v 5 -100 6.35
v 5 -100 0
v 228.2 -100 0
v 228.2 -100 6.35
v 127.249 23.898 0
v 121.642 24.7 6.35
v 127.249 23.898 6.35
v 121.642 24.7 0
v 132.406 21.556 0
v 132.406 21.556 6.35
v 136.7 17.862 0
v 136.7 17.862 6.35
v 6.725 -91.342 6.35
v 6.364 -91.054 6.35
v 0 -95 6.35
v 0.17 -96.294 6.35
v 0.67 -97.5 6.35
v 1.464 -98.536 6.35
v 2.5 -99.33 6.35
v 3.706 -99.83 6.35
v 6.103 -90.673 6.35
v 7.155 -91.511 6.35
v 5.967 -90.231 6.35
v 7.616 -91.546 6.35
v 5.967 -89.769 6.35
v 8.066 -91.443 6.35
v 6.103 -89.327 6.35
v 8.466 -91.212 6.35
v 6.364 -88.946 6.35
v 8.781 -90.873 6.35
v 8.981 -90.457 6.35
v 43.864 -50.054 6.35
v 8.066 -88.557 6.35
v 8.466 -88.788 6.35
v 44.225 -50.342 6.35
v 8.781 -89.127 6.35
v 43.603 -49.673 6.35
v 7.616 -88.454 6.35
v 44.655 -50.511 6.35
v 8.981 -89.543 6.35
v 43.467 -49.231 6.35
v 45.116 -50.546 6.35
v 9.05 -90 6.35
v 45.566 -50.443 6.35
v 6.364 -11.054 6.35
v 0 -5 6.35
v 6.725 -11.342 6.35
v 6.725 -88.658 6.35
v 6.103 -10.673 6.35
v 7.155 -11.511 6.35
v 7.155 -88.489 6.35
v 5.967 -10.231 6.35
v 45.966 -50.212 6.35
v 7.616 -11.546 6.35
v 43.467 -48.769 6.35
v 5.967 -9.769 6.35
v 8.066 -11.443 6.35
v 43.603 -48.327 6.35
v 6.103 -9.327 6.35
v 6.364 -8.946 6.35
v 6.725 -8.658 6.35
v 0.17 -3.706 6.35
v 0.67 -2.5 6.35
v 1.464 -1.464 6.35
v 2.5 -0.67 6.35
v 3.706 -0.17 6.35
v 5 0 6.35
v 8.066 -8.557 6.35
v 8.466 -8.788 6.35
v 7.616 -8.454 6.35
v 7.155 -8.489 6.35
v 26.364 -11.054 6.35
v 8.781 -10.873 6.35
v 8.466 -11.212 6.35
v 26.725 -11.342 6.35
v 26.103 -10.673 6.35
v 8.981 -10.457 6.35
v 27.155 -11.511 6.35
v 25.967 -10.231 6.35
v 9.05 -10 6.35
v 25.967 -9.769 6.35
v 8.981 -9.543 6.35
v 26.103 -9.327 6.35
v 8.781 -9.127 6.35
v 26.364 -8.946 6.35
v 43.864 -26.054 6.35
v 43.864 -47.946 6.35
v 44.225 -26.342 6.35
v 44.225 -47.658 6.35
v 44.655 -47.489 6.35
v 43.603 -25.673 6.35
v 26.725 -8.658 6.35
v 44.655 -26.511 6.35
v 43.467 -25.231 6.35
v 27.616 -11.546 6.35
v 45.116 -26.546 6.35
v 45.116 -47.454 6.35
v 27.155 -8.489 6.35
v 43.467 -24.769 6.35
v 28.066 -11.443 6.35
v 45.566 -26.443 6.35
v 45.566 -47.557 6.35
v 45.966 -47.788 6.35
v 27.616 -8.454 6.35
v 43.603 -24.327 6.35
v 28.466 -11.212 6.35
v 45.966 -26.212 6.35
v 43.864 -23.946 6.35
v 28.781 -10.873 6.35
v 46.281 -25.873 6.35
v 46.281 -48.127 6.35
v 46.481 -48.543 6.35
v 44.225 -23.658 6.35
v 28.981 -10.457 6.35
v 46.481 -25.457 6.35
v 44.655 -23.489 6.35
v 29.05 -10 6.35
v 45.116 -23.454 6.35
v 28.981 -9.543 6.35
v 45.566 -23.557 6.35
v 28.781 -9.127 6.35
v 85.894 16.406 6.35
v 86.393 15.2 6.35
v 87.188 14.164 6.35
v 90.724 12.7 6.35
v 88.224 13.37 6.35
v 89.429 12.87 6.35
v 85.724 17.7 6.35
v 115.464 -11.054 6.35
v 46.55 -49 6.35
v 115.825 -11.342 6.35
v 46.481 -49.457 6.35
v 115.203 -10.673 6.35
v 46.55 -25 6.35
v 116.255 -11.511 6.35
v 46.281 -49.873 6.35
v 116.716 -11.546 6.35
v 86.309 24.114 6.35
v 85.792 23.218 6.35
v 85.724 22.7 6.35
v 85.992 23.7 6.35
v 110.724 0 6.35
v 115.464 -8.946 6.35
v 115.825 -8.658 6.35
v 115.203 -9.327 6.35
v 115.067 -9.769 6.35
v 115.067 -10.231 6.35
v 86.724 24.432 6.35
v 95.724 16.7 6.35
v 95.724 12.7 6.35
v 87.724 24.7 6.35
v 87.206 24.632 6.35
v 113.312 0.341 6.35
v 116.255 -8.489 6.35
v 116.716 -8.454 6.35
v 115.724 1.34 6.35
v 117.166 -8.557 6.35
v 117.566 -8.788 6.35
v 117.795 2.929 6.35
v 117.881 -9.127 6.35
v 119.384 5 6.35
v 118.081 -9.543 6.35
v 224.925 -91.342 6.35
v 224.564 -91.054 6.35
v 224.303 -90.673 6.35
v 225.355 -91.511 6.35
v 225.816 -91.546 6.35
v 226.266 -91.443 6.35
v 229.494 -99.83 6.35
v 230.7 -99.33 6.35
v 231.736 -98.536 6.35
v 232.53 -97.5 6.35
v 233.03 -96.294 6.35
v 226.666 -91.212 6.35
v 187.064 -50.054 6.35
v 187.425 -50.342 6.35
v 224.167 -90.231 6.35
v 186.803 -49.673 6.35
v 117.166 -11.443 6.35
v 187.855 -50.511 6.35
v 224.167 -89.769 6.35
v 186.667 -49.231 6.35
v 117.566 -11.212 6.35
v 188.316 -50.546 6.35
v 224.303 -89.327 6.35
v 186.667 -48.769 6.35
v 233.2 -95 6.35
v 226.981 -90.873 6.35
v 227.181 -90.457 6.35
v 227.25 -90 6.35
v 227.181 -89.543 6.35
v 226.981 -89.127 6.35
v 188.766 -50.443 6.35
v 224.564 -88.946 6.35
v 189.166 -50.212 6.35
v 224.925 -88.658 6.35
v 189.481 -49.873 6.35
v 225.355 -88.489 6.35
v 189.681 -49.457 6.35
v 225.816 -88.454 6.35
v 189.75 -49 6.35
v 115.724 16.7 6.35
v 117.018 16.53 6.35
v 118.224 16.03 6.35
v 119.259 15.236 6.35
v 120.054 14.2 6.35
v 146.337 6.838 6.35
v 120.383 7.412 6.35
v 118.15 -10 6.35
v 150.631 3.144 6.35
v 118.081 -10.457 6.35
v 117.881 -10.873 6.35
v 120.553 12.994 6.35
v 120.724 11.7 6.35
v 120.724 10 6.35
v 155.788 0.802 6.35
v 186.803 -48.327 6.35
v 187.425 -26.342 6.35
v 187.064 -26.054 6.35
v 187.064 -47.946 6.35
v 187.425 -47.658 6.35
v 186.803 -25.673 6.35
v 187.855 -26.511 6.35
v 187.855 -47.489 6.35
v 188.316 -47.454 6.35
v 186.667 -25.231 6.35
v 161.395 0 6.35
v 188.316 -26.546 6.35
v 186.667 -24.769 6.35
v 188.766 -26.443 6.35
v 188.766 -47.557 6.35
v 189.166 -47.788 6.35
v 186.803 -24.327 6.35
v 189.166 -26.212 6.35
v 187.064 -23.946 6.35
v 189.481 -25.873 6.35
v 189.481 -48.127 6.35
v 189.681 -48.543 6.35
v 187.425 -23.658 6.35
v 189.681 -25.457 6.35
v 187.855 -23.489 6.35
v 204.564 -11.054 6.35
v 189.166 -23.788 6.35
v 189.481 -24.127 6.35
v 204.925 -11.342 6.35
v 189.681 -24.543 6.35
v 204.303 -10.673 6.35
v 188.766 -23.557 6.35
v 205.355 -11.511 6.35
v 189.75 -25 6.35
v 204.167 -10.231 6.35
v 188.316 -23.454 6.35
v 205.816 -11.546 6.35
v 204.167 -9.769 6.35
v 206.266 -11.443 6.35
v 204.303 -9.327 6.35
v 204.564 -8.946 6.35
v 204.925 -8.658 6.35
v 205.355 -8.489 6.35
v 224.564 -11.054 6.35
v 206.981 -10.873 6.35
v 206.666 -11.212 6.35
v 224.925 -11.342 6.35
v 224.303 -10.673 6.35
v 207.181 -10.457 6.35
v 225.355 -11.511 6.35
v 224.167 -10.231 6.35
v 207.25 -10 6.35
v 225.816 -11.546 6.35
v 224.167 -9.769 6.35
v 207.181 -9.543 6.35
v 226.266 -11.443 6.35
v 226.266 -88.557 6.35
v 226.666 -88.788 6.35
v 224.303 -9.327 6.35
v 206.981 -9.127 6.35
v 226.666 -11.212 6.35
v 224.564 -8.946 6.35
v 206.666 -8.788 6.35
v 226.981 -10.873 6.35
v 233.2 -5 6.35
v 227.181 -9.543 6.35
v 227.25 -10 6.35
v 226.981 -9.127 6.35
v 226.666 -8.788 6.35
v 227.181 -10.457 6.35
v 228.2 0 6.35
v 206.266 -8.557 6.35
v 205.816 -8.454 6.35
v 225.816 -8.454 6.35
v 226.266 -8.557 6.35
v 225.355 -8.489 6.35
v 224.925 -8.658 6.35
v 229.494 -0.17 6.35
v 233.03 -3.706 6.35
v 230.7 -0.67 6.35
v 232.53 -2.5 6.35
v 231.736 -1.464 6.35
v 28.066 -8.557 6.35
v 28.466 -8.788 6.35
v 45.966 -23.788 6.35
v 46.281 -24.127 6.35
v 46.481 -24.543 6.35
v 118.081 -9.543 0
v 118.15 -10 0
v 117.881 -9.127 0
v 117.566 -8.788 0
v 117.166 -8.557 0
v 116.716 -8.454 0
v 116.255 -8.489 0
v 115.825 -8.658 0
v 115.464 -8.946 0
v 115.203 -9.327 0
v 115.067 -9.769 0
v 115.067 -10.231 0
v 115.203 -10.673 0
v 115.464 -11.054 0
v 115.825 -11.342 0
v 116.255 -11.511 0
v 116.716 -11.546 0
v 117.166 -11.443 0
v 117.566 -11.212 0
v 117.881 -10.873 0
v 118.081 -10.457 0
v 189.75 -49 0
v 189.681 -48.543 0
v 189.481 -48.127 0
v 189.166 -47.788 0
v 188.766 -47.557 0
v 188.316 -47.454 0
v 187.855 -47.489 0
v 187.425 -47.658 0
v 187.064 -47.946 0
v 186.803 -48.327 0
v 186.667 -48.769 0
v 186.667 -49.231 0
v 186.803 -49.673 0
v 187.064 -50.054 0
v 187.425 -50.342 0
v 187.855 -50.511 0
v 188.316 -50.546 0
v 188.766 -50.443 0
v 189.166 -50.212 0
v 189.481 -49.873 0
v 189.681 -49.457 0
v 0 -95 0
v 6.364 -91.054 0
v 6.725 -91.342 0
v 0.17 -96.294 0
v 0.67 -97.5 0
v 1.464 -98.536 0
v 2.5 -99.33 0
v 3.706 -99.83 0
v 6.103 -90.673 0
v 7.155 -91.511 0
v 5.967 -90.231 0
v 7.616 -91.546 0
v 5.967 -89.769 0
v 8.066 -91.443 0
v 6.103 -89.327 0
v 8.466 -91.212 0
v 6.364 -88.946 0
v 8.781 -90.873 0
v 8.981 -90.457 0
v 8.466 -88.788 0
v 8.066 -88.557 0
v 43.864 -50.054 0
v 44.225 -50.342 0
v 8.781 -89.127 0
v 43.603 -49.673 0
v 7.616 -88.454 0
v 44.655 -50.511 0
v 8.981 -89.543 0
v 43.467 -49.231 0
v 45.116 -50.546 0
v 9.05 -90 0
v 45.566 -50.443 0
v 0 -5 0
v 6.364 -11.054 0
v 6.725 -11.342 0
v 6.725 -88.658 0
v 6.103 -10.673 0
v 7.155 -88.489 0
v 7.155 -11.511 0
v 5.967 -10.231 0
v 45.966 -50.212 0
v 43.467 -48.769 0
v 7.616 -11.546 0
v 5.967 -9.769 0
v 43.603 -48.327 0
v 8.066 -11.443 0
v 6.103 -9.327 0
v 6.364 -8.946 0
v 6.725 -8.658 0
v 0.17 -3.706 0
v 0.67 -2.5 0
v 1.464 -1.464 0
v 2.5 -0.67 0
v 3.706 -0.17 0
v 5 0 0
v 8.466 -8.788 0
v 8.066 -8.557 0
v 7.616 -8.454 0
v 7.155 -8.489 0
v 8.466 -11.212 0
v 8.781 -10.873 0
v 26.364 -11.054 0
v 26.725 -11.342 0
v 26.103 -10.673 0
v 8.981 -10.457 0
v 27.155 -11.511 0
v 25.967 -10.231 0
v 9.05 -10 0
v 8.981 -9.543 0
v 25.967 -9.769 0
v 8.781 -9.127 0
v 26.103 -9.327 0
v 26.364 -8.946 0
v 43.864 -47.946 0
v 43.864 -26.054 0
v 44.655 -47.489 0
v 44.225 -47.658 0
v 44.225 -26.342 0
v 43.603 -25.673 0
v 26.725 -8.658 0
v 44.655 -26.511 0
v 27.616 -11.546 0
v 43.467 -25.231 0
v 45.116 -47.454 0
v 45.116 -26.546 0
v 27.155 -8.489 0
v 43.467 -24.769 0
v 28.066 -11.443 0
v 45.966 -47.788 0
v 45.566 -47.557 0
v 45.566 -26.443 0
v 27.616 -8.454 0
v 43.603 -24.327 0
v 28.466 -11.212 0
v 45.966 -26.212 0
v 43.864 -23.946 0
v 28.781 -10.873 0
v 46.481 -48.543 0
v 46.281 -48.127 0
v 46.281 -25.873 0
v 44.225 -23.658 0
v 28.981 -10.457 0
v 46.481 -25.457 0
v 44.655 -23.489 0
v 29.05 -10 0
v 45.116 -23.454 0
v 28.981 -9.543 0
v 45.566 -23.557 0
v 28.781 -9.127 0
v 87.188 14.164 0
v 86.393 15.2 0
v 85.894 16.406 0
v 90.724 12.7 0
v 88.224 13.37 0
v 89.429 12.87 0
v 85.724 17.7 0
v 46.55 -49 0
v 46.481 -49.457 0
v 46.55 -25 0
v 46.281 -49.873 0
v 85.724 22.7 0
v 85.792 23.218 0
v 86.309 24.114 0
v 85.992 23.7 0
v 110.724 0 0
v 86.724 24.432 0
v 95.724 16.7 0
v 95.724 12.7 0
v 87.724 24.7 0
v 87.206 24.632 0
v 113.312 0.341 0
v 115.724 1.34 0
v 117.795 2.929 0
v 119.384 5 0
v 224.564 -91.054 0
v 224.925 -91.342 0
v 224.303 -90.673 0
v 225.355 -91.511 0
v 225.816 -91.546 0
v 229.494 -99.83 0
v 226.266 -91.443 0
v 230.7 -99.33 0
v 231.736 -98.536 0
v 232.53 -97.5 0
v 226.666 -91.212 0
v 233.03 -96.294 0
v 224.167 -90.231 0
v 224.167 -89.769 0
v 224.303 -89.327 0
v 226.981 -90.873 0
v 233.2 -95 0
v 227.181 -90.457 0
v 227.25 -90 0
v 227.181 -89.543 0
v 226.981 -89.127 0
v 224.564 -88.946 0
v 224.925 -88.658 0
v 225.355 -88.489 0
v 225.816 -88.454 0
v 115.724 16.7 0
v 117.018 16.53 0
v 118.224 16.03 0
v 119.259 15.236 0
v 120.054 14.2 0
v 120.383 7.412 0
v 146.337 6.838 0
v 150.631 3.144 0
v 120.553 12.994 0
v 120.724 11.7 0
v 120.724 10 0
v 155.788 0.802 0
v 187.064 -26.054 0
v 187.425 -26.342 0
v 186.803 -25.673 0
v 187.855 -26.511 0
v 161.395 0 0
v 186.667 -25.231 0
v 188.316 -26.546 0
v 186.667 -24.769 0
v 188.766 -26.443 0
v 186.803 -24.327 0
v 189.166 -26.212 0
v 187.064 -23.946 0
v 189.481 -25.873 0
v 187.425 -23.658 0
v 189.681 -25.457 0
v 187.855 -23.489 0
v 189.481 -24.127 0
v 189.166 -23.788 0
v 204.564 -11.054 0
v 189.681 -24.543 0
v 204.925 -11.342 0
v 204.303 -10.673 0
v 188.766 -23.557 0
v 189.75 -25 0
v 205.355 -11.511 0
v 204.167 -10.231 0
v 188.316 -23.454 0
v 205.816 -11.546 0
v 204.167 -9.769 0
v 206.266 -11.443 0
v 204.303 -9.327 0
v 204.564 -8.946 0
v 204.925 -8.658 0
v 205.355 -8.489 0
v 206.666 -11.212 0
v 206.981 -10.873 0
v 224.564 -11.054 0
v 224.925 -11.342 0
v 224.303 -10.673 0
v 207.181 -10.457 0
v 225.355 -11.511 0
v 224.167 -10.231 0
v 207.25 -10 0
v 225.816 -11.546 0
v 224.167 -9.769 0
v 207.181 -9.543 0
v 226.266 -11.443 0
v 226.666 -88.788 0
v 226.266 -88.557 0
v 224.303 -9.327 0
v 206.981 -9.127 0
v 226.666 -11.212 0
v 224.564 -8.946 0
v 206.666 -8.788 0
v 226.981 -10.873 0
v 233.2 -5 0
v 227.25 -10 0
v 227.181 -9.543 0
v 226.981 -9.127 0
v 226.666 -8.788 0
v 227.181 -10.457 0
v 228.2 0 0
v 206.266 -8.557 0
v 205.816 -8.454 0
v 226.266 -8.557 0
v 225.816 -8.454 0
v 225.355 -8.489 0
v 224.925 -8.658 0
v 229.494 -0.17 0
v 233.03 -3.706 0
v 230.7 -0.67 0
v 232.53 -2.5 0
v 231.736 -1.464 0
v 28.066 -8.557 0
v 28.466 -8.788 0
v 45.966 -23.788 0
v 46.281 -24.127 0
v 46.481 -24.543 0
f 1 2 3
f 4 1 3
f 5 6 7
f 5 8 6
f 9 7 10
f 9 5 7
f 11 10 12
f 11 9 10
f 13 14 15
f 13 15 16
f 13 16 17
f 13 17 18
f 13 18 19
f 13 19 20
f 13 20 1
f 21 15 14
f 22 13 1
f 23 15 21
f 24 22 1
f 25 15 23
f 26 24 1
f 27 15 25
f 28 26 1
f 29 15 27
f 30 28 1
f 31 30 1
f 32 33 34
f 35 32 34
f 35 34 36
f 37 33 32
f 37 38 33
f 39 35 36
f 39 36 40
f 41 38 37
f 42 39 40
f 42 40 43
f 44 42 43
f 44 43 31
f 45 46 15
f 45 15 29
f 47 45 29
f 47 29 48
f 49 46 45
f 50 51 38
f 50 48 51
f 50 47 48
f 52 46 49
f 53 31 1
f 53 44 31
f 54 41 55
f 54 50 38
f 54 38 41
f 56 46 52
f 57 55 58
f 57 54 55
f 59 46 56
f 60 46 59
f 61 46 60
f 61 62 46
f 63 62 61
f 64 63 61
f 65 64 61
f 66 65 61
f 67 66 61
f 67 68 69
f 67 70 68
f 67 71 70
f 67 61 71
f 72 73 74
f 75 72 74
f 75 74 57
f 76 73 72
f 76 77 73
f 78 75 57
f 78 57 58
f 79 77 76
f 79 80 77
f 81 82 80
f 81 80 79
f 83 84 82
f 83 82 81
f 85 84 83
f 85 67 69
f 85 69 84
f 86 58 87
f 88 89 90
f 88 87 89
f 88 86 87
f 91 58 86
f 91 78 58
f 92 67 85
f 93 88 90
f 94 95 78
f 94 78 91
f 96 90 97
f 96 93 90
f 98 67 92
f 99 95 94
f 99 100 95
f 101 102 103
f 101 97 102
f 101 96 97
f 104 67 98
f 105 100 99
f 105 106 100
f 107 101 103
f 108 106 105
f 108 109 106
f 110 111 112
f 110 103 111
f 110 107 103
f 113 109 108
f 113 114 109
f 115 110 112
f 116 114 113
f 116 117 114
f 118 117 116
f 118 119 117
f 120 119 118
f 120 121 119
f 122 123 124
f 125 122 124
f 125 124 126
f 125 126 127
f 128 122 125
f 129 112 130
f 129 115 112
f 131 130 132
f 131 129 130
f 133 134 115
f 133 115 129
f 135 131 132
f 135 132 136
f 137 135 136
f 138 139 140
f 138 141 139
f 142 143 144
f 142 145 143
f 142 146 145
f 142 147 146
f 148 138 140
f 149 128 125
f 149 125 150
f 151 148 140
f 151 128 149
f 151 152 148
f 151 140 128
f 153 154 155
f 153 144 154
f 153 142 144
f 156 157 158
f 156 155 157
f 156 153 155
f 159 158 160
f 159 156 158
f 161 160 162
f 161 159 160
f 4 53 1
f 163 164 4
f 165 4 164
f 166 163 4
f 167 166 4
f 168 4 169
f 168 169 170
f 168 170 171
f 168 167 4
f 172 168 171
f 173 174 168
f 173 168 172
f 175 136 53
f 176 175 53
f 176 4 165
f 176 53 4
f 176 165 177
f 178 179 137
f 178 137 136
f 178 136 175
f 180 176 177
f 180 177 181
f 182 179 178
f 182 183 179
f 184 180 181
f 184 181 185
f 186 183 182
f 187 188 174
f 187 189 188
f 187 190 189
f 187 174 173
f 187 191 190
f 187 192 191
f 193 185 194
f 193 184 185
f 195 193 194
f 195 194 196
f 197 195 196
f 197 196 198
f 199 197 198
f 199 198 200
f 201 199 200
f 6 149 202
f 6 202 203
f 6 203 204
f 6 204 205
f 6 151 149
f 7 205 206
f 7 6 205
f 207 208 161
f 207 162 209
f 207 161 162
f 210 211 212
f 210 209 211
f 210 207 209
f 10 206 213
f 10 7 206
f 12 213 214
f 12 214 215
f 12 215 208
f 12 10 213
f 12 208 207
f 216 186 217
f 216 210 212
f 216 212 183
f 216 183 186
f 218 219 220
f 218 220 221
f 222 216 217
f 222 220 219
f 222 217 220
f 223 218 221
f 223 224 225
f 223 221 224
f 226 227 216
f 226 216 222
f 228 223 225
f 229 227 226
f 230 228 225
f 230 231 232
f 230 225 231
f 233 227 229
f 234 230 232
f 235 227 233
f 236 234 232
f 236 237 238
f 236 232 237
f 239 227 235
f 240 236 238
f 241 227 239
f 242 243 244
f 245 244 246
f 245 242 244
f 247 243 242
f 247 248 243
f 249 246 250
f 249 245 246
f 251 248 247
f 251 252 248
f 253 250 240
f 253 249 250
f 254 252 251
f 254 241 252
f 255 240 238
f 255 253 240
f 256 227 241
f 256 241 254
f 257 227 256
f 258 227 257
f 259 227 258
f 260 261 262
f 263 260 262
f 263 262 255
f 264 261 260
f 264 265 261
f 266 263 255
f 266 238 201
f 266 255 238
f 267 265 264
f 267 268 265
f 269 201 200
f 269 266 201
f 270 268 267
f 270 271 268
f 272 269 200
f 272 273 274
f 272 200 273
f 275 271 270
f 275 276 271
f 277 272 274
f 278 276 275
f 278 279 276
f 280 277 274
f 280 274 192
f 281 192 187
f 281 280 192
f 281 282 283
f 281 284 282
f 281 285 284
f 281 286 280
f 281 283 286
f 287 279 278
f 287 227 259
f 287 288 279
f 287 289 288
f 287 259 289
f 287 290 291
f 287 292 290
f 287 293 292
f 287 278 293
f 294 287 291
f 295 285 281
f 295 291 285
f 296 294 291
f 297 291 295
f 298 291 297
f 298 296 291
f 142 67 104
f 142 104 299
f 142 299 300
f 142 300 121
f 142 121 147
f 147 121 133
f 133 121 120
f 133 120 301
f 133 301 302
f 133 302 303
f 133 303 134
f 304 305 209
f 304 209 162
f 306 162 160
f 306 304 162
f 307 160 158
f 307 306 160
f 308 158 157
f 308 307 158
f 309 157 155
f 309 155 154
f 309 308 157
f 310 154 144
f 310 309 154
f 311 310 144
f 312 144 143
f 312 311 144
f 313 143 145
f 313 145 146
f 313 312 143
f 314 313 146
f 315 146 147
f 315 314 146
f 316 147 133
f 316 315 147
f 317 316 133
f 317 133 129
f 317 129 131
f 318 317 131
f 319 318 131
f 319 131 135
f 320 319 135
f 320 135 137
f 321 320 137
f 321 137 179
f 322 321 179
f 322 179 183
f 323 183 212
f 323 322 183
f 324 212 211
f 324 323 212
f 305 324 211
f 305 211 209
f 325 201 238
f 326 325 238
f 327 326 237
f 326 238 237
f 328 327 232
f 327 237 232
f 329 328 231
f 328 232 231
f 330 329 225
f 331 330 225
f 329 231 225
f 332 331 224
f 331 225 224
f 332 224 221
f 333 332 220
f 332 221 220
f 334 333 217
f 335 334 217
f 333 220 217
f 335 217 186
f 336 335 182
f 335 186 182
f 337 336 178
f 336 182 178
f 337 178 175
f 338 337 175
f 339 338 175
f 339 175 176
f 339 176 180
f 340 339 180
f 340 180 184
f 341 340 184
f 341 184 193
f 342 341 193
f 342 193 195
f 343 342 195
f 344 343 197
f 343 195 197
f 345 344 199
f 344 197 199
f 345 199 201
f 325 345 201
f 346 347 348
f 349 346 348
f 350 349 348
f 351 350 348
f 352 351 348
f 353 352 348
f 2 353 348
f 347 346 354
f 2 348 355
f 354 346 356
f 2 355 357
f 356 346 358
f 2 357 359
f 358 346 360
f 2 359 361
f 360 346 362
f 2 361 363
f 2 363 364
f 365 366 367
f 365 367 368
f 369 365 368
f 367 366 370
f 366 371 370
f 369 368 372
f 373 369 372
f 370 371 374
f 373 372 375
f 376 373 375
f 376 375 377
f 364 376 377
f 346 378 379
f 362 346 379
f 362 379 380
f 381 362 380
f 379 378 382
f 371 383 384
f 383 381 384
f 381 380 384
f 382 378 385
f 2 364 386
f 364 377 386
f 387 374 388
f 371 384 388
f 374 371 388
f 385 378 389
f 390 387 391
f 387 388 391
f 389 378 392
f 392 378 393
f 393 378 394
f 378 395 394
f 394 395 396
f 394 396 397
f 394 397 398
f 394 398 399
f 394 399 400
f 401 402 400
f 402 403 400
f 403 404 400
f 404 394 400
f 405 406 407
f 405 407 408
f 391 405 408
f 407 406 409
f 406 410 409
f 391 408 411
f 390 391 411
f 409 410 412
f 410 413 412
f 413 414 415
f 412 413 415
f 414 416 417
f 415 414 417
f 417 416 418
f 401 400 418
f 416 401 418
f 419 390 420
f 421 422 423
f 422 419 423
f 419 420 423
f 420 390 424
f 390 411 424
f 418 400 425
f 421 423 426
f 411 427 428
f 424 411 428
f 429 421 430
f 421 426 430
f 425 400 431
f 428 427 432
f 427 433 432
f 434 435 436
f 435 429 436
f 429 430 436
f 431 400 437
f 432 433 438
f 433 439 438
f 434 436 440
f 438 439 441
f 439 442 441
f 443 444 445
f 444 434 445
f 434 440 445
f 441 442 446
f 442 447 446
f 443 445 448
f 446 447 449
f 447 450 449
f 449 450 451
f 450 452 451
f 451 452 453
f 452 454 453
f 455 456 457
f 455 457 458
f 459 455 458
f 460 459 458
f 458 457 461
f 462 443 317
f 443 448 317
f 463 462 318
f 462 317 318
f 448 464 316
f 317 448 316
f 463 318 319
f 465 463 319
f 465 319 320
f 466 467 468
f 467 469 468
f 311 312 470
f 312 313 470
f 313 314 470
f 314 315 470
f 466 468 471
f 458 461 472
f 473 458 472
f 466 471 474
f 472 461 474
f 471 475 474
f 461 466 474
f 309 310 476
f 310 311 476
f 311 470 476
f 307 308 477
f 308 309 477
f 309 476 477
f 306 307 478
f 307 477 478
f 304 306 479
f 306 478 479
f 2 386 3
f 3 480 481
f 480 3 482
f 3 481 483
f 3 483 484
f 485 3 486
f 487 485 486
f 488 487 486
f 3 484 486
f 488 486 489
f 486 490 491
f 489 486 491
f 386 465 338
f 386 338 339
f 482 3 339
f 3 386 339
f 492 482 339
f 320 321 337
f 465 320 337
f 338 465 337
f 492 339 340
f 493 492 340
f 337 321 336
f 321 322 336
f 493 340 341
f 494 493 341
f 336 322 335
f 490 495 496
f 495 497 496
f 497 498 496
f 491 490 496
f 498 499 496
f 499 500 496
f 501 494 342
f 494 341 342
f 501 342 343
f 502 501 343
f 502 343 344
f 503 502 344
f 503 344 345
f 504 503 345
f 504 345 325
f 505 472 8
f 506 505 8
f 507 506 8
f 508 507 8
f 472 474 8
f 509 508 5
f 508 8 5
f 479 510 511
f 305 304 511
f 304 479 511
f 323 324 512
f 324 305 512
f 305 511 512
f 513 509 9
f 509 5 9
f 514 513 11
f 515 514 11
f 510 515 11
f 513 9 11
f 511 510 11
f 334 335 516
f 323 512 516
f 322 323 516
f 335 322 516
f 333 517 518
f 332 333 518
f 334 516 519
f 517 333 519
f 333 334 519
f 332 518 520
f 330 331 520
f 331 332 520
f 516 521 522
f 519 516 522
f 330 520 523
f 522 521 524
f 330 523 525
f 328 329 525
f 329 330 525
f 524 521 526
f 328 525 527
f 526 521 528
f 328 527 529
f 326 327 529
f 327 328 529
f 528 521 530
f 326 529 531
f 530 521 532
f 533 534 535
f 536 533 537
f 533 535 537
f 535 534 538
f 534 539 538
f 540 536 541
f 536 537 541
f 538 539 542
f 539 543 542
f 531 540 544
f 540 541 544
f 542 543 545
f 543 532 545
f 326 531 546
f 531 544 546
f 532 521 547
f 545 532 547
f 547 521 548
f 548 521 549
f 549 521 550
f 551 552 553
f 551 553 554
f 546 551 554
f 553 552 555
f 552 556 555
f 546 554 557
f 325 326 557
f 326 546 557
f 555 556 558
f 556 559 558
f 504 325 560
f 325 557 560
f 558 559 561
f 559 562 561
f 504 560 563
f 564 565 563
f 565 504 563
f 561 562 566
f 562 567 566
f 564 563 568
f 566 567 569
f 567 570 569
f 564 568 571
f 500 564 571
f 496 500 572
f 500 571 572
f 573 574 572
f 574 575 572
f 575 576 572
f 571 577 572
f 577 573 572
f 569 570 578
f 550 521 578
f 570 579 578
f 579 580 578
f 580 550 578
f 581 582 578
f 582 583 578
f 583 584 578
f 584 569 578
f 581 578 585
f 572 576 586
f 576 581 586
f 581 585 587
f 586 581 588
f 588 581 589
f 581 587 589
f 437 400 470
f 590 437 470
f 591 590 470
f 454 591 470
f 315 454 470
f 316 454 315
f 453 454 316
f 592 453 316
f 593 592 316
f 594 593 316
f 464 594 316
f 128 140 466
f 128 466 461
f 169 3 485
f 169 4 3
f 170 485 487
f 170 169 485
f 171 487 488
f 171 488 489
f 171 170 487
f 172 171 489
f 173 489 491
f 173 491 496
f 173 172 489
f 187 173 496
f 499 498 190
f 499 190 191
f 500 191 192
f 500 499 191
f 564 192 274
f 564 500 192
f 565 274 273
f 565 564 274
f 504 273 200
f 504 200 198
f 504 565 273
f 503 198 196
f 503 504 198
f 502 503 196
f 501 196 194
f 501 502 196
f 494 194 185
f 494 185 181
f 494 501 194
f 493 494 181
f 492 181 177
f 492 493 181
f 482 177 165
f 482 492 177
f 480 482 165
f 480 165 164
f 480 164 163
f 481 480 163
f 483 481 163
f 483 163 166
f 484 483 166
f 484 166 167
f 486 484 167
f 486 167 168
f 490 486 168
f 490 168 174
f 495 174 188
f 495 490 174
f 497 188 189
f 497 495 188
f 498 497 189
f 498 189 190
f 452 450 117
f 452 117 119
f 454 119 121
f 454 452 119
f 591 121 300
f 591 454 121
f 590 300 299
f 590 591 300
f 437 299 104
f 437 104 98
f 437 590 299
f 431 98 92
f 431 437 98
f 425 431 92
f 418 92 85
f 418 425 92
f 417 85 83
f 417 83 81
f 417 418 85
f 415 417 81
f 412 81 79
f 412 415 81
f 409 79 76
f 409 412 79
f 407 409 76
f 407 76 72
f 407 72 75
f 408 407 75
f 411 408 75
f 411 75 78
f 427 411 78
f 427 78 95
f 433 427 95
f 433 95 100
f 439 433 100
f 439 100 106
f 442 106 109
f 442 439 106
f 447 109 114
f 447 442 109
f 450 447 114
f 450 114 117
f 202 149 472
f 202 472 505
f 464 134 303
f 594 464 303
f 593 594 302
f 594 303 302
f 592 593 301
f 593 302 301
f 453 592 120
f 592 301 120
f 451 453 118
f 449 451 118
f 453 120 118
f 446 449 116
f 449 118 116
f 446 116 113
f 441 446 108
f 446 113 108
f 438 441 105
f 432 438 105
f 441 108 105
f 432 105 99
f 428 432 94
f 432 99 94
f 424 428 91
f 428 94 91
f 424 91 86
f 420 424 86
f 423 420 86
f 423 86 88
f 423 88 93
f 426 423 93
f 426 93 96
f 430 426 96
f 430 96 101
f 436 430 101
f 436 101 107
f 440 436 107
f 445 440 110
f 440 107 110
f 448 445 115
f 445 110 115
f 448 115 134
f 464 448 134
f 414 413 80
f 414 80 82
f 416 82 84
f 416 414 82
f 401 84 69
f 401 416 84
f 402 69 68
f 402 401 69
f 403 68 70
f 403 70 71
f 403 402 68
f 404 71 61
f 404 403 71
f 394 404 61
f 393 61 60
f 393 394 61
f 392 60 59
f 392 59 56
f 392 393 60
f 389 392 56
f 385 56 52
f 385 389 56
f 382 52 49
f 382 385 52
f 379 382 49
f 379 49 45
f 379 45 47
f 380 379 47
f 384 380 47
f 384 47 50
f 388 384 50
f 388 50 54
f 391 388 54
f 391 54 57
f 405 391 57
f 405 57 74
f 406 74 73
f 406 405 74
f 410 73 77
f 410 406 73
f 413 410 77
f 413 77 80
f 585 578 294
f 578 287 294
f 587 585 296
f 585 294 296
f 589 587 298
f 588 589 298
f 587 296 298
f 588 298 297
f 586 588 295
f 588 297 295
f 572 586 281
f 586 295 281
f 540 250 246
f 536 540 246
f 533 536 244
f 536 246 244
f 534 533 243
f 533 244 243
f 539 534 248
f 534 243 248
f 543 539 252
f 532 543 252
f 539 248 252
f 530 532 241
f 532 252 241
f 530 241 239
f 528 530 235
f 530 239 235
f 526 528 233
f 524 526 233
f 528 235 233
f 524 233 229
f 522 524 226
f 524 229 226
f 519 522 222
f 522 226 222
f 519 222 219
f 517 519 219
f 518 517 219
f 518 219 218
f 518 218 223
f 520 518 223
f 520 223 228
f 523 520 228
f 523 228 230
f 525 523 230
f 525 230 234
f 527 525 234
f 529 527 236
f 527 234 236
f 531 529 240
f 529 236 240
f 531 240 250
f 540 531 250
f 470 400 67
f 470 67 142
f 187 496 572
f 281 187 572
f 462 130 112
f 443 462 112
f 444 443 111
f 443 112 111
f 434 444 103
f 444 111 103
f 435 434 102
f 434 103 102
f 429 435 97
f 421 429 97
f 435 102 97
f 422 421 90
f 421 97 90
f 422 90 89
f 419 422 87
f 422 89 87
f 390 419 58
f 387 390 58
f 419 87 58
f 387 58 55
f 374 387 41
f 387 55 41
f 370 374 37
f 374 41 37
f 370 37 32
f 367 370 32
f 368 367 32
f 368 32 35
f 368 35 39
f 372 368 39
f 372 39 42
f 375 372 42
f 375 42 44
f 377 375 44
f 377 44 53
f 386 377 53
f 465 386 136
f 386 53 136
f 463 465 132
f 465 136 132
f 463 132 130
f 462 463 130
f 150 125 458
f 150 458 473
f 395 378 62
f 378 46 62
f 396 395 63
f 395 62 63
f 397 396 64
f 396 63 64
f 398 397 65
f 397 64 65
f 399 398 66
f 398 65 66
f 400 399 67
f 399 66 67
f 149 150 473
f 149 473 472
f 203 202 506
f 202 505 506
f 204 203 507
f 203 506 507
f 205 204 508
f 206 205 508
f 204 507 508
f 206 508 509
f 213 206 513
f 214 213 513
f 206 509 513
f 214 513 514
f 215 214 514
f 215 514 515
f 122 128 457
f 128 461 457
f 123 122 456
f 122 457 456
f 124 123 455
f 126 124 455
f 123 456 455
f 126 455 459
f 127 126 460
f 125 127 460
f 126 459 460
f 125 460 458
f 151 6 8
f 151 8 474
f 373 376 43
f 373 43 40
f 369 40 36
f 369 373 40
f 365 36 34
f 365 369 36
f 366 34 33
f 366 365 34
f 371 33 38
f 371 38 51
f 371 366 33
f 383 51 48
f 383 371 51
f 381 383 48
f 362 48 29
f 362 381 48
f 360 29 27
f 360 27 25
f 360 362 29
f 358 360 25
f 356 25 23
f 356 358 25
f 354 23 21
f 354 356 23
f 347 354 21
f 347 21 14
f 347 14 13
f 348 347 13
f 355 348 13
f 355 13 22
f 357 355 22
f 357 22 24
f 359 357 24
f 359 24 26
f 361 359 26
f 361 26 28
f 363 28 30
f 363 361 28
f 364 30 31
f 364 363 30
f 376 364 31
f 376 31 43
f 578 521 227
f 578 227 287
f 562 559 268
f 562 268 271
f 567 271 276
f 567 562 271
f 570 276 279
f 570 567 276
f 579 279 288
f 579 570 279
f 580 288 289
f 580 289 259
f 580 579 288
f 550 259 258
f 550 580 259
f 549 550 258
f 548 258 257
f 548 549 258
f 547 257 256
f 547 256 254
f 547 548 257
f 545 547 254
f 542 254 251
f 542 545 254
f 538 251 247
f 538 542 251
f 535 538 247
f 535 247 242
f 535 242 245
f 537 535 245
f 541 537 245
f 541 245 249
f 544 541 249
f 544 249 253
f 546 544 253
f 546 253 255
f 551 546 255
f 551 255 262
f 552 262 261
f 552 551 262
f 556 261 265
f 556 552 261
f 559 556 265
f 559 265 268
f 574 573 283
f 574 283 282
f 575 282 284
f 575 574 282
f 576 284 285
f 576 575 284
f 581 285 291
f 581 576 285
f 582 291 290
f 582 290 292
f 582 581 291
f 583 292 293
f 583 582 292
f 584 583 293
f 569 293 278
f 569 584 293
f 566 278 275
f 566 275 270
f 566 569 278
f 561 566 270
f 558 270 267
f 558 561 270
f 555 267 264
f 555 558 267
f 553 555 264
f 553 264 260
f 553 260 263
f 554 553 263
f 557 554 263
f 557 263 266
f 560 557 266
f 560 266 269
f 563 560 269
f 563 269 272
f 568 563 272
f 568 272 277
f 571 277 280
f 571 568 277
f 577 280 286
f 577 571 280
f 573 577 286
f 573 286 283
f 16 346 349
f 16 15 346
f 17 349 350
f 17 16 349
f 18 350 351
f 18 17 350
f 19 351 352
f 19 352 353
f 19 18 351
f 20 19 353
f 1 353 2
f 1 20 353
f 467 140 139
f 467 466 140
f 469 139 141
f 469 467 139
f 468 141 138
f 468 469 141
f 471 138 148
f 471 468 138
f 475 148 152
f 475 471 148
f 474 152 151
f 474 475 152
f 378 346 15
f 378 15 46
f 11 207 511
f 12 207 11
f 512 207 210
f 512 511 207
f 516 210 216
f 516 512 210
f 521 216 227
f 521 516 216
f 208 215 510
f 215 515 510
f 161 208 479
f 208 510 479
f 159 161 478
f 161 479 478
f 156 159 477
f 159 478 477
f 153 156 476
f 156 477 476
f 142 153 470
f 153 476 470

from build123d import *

# Parameters (mm, degrees)
SKETCH1_W           = 233.2
SKETCH1_H           = 100
SKETCH1_R           = 1.55
BOSS_EXTRUDE1_DEPTH = 6.35
FILLET1_R           = 5
SKETCH2_R           = 1.55
CUT_EXTRUDE1_DEPTH  = 6.35
SKETCH3_W           = 10
SKETCH3_H           = 12.7
BOSS_EXTRUDE2_DEPTH = 6.35
FILLET2_R           = 5
FILLET3_R           = 10
FILLET4_R           = 2
FILLET5_R           = 20
FILLET6_R           = 5


with BuildPart() as part:
    # Sketch1 → Boss-Extrude1 (new body)
    with BuildSketch(Plane.XY):
        with Locations((116.6, -50)):
            Rectangle(SKETCH1_W, SKETCH1_H)
        with Locations((7.5, -10)):
            Circle(SKETCH1_R, mode=Mode.SUBTRACT)
        with Locations((225.7, -10)):
            Circle(SKETCH1_R, mode=Mode.SUBTRACT)
        with Locations((7.5, -90)):
            Circle(SKETCH1_R, mode=Mode.SUBTRACT)
        with Locations((225.7, -90)):
            Circle(SKETCH1_R, mode=Mode.SUBTRACT)
        with Locations((27.5, -10)):
            Circle(SKETCH1_R, mode=Mode.SUBTRACT)
        with Locations((205.7, -10)):
            Circle(SKETCH1_R, mode=Mode.SUBTRACT)
        with Locations((116.6, -10)):
            Circle(SKETCH1_R, mode=Mode.SUBTRACT)
    extrude(amount=BOSS_EXTRUDE1_DEPTH)

    # Fillet1
    fillet1_edges = [part.edges().sort_by_distance(p)[0] for p in [
        (233.2, -100, 3.175),
        (0, -100, 3.175),
        (0, 0, 3.175),
        (233.2, 0, 3.175),
    ]]
    fillet(fillet1_edges, radius=FILLET1_R)

    # Sketch2 → Cut-Extrude1 (cut)
    with BuildSketch(Plane.XY.offset(6.35)):
        with Locations((45, -25)):
            Circle(SKETCH2_R)
        with Locations((45, -49)):
            Circle(SKETCH2_R)
        with Locations((188.2, -49)):
            Circle(SKETCH2_R)
        with Locations((188.2, -25)):
            Circle(SKETCH2_R)
    extrude(amount=-CUT_EXTRUDE1_DEPTH, mode=Mode.SUBTRACT)

    # Sketch3 → Boss-Extrude2 (add)
    with BuildSketch(Plane.XY.offset(6.35)):
        with Locations((125.723568259, 6.35)):
            Rectangle(SKETCH3_W, SKETCH3_H)
        Polygon((120.723568259, 16.7), (120.723568259, 12.7), (130.723568259, 12.7), (130.723568259, 24.7), (85.723568259, 24.7), (85.723568259, 12.7), (95.723568259, 12.7), (95.723568259, 16.7), align=None)
        Polygon((130.723568259, 12.7), (130.723568259, 0), (152.313568259, 0), (130.723568259, 24.7), align=None)
    extrude(amount=-BOSS_EXTRUDE2_DEPTH)

    # Fillet2
    fillet2_edges = [part.edges().sort_by_distance(p)[0] for p in [
        (85.723568259, 12.7, 3.175),
    ]]
    fillet(fillet2_edges, radius=FILLET2_R)

    # Fillet3
    fillet3_edges = [part.edges().sort_by_distance(p)[0] for p in [
        (120.723568259, 0, 3.175),
    ]]
    fillet(fillet3_edges, radius=FILLET3_R)

    # Fillet4
    fillet4_edges = [part.edges().sort_by_distance(p)[0] for p in [
        (85.723568259, 24.7, 3.175),
    ]]
    fillet(fillet4_edges, radius=FILLET4_R)

    # Fillet5
    fillet5_edges = [part.edges().sort_by_distance(p)[0] for p in [
        (130.723568259, 24.7, 3.175),
        (152.313568259, 0, 3.175),
    ]]
    fillet(fillet5_edges, radius=FILLET5_R)

    # Fillet6
    fillet6_edges = [part.edges().sort_by_distance(p)[0] for p in [
        (120.723568259, 16.7, 3.175),
    ]]
    fillet(fillet6_edges, radius=FILLET6_R)


solid = part.part
